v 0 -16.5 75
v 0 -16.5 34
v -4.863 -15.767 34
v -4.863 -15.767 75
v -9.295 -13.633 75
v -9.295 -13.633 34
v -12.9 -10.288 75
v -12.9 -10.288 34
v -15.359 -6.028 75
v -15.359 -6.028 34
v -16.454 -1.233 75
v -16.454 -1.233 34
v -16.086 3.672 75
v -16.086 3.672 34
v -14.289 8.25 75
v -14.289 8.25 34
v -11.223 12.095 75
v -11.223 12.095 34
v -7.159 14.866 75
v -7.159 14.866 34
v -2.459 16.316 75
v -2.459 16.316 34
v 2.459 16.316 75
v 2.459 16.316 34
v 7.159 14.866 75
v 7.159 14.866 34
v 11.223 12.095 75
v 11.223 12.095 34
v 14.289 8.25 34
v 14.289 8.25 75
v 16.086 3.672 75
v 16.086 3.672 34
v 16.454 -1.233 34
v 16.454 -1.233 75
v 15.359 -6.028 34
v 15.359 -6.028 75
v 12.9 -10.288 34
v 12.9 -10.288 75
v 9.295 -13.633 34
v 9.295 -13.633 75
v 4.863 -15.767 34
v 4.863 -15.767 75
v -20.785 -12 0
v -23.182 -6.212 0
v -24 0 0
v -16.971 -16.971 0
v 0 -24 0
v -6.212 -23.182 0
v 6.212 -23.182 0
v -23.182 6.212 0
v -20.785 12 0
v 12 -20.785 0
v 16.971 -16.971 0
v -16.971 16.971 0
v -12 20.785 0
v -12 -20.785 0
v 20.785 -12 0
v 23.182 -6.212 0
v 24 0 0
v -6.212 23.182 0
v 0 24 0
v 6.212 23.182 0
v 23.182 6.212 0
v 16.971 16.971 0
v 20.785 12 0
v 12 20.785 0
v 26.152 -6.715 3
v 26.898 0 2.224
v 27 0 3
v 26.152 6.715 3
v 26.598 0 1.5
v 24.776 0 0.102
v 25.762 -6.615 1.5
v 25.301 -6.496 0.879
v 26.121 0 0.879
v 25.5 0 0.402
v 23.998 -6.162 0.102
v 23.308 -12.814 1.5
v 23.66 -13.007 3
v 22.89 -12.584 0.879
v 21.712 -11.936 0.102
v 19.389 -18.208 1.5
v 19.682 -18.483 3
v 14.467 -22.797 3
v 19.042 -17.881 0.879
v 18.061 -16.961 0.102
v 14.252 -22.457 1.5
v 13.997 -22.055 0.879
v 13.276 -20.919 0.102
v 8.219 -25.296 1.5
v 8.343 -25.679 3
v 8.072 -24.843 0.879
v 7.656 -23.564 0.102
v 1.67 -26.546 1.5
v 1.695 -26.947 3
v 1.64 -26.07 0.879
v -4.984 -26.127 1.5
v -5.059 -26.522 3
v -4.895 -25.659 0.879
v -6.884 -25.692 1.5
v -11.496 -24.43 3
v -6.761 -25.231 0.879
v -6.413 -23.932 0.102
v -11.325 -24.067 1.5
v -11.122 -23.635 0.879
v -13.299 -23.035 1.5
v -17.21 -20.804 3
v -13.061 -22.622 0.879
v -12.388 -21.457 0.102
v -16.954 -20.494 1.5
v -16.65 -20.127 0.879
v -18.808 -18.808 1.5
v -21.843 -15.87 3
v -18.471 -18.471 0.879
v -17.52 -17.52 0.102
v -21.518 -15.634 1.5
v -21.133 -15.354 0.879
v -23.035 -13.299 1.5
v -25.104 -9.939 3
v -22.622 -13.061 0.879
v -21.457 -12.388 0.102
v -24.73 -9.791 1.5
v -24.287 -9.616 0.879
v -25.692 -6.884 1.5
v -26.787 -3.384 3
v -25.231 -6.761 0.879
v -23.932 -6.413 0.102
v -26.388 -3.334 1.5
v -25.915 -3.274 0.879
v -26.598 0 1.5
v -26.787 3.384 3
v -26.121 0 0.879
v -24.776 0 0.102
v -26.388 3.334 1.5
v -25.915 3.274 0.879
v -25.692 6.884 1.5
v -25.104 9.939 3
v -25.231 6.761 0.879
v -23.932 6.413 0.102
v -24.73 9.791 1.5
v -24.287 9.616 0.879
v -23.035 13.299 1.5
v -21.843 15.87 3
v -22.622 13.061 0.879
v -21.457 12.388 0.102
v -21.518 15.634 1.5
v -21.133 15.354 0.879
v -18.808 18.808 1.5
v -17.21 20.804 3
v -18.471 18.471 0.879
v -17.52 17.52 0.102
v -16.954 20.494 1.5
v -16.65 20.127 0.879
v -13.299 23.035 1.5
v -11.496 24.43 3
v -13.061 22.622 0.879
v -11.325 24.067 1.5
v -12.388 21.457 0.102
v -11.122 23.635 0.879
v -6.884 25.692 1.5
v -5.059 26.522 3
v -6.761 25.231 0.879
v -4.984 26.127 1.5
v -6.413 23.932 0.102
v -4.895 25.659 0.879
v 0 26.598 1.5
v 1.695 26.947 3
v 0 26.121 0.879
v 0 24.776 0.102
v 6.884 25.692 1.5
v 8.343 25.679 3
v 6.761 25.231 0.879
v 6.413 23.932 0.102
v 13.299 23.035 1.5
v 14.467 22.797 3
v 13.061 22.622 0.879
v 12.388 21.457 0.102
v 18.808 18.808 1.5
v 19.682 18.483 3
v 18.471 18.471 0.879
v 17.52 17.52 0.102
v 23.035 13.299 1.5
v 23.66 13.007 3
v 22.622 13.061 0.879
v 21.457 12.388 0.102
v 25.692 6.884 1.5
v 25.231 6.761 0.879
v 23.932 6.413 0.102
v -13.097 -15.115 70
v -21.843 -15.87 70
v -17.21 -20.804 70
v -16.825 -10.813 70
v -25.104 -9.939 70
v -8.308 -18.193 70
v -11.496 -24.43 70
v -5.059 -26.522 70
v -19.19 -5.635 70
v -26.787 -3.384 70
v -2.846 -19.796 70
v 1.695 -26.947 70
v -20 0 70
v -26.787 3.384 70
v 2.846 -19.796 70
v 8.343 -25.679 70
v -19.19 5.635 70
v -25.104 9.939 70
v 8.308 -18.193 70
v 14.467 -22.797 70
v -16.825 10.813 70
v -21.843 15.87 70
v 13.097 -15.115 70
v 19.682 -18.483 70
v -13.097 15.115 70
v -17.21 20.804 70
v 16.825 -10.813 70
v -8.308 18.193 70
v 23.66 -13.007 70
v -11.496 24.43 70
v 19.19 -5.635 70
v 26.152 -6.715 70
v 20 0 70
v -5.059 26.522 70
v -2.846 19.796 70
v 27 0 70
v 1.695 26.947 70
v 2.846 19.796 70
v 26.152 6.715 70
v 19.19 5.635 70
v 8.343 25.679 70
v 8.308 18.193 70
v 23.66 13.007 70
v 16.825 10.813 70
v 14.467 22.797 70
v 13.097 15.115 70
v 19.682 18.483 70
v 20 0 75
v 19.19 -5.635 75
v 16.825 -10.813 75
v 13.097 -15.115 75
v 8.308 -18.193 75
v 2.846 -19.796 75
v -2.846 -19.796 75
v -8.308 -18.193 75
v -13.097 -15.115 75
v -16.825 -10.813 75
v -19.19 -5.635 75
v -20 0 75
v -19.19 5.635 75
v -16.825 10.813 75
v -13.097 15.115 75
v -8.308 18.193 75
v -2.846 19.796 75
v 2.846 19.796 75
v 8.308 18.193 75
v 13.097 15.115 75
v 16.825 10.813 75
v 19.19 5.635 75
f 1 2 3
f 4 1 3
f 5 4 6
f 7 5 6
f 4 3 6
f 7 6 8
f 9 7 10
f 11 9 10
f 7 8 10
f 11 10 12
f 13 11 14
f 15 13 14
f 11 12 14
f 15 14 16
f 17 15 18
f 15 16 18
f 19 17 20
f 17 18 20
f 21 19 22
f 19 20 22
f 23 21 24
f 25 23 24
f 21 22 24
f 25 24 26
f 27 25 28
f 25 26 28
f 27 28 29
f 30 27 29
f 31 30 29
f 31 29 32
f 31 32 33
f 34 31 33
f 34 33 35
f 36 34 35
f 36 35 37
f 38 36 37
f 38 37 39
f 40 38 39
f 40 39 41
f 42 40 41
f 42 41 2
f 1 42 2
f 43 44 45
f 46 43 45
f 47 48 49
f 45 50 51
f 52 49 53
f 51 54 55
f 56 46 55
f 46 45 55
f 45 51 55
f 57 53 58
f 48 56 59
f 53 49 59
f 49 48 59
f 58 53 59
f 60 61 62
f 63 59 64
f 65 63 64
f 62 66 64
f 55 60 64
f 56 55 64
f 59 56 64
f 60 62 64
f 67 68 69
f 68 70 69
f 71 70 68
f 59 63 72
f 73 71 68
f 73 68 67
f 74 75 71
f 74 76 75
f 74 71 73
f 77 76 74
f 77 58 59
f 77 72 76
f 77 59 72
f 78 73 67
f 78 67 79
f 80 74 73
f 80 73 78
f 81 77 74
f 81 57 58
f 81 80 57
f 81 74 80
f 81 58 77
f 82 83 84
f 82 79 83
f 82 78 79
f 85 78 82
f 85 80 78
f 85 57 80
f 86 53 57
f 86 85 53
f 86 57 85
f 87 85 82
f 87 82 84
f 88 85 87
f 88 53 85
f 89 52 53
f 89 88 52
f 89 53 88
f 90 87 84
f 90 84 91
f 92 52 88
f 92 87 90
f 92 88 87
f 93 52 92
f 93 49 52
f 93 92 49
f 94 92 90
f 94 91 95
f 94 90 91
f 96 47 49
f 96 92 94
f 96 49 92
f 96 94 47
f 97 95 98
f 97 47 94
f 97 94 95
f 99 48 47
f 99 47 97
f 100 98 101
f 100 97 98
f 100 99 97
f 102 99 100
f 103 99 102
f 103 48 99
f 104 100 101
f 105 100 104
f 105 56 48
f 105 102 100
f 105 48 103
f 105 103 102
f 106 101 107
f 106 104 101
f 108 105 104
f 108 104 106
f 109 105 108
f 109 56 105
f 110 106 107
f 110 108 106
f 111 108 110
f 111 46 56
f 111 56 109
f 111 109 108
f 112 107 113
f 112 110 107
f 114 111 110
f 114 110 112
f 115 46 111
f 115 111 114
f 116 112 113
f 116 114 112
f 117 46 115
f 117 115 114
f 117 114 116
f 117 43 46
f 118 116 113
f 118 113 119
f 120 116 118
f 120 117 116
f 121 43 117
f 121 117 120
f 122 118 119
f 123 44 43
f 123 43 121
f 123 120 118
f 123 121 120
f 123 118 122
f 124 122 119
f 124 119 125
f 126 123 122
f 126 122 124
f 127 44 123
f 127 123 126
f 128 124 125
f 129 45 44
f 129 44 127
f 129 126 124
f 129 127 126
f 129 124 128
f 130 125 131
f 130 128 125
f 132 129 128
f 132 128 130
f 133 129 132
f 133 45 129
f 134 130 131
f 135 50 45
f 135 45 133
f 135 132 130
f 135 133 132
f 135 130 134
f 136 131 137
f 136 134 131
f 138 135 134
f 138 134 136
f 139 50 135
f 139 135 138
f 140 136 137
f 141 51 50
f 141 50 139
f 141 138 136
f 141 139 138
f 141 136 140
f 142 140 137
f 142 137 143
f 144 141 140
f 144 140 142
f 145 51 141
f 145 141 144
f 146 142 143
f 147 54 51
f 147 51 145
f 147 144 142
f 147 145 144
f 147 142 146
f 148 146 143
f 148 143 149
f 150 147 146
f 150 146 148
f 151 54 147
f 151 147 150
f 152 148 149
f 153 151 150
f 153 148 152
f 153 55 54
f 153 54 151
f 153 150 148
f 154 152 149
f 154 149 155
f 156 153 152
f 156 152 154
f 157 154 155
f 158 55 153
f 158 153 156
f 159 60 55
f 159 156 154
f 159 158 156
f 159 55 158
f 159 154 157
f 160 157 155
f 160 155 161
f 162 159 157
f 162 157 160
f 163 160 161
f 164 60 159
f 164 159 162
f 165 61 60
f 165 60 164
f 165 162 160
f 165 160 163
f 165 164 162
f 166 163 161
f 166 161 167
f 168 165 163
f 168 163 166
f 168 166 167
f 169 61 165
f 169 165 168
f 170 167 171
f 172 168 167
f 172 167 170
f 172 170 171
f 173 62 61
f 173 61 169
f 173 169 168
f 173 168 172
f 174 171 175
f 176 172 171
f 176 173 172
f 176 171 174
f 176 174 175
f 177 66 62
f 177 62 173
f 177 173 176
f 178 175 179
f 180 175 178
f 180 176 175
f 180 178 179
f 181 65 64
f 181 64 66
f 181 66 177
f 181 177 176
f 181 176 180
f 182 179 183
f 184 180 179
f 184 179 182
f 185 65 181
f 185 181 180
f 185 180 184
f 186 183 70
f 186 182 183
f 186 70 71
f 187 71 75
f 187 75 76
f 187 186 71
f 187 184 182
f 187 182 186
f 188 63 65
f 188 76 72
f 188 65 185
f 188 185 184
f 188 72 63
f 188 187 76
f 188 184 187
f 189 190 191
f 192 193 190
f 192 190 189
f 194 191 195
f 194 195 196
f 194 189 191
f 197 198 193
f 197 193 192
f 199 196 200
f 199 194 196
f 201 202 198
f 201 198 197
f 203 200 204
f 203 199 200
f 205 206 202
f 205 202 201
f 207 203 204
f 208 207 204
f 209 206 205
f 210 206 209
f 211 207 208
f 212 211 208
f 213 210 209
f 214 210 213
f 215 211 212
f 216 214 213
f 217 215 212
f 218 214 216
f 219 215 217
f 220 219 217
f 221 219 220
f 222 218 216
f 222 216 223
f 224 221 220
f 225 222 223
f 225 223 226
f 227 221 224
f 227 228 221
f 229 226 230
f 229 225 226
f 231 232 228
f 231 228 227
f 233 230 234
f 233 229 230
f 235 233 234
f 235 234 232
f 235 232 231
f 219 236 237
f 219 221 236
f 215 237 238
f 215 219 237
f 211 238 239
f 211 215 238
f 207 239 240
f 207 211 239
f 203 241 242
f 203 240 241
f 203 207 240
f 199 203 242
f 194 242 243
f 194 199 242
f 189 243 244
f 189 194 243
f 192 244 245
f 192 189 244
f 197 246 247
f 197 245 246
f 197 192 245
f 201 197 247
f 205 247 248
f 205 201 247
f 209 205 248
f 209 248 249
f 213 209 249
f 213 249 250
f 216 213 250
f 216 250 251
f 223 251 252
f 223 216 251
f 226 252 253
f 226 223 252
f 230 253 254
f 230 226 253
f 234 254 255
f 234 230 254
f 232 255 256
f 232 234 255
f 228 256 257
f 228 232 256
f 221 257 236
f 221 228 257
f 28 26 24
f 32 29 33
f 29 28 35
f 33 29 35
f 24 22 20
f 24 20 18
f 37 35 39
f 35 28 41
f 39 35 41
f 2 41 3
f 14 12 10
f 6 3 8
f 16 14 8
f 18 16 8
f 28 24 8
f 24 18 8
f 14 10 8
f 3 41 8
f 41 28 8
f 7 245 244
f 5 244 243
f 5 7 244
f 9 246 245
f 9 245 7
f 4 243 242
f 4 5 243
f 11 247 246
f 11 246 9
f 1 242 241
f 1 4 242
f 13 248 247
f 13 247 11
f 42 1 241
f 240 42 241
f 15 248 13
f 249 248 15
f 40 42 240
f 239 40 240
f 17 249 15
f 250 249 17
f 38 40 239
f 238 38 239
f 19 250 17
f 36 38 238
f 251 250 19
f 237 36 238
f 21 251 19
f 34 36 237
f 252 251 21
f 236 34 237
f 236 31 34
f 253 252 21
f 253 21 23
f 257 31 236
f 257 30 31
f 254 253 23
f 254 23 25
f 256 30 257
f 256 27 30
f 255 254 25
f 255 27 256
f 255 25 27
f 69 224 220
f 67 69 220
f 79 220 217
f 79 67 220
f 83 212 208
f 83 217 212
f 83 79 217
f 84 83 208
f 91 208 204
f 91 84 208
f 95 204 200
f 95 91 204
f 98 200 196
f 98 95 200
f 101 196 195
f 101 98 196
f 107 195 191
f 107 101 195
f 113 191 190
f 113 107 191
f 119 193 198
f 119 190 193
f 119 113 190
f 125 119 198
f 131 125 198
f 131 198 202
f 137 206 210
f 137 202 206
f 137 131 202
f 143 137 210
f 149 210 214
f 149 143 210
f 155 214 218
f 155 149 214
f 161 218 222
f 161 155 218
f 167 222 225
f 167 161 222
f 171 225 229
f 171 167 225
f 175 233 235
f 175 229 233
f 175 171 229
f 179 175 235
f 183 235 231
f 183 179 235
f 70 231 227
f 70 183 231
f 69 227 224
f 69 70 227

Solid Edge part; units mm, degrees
sketch "Sketch1" plane through (0, 0, 0) normal (0, 0, 1) x (1, 0, 0)
  circle A0 centre (0, 0) radius 27
extrude "Protrusion1" add sketch "Sketch1" along normal blind 70
sketch "Sketch2" plane through (0, 0, 70) normal (0, 0, 1) x (1, 0, 0)
  circle A0 centre (0, 0) radius 20
extrude "ProtrusiónExtruida_2" add sketch "Sketch2" along normal blind 5
hole "Agujero_1" at (0, 0, 75) direction (0, 0, -1) diameter 33 depth 41
fillet "Redondeo_1" radius 3 1 edges at (-27, 0, 0)
